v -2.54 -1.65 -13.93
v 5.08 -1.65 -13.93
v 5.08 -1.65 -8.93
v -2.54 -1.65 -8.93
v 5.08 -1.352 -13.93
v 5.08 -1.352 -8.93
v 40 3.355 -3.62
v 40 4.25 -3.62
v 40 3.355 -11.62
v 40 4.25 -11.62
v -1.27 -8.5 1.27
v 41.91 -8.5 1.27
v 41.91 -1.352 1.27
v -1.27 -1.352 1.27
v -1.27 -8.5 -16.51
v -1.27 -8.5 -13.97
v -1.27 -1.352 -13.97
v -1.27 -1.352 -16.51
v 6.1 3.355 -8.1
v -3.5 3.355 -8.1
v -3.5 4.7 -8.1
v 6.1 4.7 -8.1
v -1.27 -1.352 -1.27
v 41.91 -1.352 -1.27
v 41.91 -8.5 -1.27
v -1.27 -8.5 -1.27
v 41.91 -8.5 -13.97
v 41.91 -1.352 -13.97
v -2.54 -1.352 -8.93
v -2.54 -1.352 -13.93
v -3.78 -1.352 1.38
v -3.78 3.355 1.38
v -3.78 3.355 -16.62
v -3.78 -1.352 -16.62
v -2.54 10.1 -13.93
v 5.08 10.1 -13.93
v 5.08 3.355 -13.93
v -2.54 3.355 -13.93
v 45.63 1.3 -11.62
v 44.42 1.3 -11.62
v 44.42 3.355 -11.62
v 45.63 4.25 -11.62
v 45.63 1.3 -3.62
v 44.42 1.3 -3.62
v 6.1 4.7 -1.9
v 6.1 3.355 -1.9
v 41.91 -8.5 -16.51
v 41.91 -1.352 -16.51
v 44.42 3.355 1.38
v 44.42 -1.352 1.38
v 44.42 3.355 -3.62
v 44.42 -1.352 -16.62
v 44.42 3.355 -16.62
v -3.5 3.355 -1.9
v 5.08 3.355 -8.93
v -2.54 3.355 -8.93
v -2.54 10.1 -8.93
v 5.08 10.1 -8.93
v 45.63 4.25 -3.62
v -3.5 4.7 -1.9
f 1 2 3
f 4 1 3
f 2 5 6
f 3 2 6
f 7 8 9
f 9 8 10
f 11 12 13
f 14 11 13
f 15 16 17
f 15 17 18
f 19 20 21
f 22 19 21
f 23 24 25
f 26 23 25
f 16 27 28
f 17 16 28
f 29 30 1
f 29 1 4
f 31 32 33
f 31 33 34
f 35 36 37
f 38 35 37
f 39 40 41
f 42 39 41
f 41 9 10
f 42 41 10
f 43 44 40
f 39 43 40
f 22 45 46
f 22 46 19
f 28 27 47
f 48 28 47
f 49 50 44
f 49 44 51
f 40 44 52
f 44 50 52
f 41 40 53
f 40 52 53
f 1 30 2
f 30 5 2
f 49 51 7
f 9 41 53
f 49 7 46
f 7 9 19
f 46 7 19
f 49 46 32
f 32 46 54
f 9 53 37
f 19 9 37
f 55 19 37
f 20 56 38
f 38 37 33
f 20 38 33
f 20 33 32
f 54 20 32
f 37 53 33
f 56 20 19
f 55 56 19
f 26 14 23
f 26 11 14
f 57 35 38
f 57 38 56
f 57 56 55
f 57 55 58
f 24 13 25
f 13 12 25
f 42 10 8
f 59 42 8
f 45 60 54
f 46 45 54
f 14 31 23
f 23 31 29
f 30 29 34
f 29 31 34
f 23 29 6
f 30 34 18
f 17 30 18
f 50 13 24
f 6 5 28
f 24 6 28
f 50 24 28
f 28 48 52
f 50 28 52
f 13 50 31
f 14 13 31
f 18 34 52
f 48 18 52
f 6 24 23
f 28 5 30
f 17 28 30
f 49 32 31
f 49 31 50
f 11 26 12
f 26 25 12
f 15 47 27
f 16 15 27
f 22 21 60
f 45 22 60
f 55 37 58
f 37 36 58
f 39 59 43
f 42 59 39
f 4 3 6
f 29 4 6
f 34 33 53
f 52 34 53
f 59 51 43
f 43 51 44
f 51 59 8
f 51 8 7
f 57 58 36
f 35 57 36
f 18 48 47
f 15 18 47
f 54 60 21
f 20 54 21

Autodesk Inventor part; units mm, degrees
ref_plane "YZ Plane" through (0, 0, 0) normal (1, 0, 0) x (0, 1, 0)
ref_plane "XZ Plane" through (0, 0, 0) normal (0, 1, 0) x (-1, 0, 0)
ref_plane "XY Plane" through (0, 0, 0) normal (0, 0, 1) x (1, 0, 0)
sketch "Sketch1" plane through (-3.78, -1.3516, -16.62) normal (0, 0, 1) x (1, 0, 0)
  line L0 (0, 0) -> (48.2, 0)
  line L1 (48.2, 0) -> (48.2, 4.7063)
  line L2 (48.2, 4.7063) -> (0, 4.7063)
  line L3 (0, 4.7063) -> (0, 0)
extrude "Extrusion1" add sketch "Sketch1" along normal blind 18
sketch "Sketch2" plane through (0, -1.65, -13.93) normal (-1, 0, 0) x (0, 0, 1)
  line L0 (0, 0) -> (5, 0)
  line L1 (5, 0) -> (5, 11.75)
  line L2 (5, 11.75) -> (0, 11.75)
  line L3 (0, 11.75) -> (0, 0)
extrude "Extrusion2" add sketch "Sketch2" along normal blind 2.54
sketch "Sketch3" plane through (5.08, -1.65, -13.93) normal (-1, 0, 0) x (0, 0, 1)
  line L0 (0, 0) -> (5, 0)
  line L1 (5, 0) -> (5, 11.75)
  line L2 (5, 11.75) -> (0, 11.75)
  line L3 (0, 11.75) -> (0, 0)
extrude "Extrusion3" add sketch "Sketch3" along normal blind 2.54
sketch "Sketch4" plane through (2.54, -1.65, -13.93) normal (-1, 0, 0) x (0, 0, 1)
  line L0 (0, 0) -> (5, 0)
  line L1 (5, 0) -> (5, 11.75)
  line L2 (5, 11.75) -> (0, 11.75)
  line L3 (0, 11.75) -> (0, 0)
extrude "Extrusion4" add sketch "Sketch4" along normal blind 2.54
sketch "Sketch5" plane through (-3.5, 1.6, -1.9) normal (1, 0, 0) x (0, 0, -1)
  line L0 (0, 0) -> (6.2, 0)
  line L1 (6.2, 0) -> (6.2, 3.1)
  line L2 (6.2, 3.1) -> (0, 3.1)
  line L3 (0, 3.1) -> (0, 0)
extrude "Extrusion5" add sketch "Sketch5" along normal blind 9.6
sketch "Sketch6" plane through (40, 1.3, -3.62) normal (1, 0, 0) x (0, 0, -1)
  line L0 (0, 0) -> (8, 0)
  line L1 (8, 0) -> (8, 2.95)
  line L2 (8, 2.95) -> (0, 2.95)
  line L3 (0, 2.95) -> (0, 0)
extrude "Extrusion6" add sketch "Sketch6" along normal blind 5.63
sketch "Sketch7" plane through (41.91, 3.25, -13.97) normal (-1, 0, 0) x (0, 0, -1)
  line L0 (0, 0) -> (2.54, 0)
  line L1 (2.54, 0) -> (2.54, 11.75)
  line L2 (2.54, 11.75) -> (0, 11.75)
  line L3 (0, 11.75) -> (0, 0)
extrude "Extrusion7" add sketch "Sketch7" along normal blind 43.18
sketch "Sketch8" plane through (41.91, 3.25, 1.27) normal (-1, 0, 0) x (0, 0, -1)
  line L0 (0, 0) -> (2.54, 0)
  line L1 (2.54, 0) -> (2.54, 11.75)
  line L2 (2.54, 11.75) -> (0, 11.75)
  line L3 (0, 11.75) -> (0, 0)
extrude "Extrusion8" add sketch "Sketch8" along normal blind 43.18
properties part number "ARDUINO MICRO Simplified"
